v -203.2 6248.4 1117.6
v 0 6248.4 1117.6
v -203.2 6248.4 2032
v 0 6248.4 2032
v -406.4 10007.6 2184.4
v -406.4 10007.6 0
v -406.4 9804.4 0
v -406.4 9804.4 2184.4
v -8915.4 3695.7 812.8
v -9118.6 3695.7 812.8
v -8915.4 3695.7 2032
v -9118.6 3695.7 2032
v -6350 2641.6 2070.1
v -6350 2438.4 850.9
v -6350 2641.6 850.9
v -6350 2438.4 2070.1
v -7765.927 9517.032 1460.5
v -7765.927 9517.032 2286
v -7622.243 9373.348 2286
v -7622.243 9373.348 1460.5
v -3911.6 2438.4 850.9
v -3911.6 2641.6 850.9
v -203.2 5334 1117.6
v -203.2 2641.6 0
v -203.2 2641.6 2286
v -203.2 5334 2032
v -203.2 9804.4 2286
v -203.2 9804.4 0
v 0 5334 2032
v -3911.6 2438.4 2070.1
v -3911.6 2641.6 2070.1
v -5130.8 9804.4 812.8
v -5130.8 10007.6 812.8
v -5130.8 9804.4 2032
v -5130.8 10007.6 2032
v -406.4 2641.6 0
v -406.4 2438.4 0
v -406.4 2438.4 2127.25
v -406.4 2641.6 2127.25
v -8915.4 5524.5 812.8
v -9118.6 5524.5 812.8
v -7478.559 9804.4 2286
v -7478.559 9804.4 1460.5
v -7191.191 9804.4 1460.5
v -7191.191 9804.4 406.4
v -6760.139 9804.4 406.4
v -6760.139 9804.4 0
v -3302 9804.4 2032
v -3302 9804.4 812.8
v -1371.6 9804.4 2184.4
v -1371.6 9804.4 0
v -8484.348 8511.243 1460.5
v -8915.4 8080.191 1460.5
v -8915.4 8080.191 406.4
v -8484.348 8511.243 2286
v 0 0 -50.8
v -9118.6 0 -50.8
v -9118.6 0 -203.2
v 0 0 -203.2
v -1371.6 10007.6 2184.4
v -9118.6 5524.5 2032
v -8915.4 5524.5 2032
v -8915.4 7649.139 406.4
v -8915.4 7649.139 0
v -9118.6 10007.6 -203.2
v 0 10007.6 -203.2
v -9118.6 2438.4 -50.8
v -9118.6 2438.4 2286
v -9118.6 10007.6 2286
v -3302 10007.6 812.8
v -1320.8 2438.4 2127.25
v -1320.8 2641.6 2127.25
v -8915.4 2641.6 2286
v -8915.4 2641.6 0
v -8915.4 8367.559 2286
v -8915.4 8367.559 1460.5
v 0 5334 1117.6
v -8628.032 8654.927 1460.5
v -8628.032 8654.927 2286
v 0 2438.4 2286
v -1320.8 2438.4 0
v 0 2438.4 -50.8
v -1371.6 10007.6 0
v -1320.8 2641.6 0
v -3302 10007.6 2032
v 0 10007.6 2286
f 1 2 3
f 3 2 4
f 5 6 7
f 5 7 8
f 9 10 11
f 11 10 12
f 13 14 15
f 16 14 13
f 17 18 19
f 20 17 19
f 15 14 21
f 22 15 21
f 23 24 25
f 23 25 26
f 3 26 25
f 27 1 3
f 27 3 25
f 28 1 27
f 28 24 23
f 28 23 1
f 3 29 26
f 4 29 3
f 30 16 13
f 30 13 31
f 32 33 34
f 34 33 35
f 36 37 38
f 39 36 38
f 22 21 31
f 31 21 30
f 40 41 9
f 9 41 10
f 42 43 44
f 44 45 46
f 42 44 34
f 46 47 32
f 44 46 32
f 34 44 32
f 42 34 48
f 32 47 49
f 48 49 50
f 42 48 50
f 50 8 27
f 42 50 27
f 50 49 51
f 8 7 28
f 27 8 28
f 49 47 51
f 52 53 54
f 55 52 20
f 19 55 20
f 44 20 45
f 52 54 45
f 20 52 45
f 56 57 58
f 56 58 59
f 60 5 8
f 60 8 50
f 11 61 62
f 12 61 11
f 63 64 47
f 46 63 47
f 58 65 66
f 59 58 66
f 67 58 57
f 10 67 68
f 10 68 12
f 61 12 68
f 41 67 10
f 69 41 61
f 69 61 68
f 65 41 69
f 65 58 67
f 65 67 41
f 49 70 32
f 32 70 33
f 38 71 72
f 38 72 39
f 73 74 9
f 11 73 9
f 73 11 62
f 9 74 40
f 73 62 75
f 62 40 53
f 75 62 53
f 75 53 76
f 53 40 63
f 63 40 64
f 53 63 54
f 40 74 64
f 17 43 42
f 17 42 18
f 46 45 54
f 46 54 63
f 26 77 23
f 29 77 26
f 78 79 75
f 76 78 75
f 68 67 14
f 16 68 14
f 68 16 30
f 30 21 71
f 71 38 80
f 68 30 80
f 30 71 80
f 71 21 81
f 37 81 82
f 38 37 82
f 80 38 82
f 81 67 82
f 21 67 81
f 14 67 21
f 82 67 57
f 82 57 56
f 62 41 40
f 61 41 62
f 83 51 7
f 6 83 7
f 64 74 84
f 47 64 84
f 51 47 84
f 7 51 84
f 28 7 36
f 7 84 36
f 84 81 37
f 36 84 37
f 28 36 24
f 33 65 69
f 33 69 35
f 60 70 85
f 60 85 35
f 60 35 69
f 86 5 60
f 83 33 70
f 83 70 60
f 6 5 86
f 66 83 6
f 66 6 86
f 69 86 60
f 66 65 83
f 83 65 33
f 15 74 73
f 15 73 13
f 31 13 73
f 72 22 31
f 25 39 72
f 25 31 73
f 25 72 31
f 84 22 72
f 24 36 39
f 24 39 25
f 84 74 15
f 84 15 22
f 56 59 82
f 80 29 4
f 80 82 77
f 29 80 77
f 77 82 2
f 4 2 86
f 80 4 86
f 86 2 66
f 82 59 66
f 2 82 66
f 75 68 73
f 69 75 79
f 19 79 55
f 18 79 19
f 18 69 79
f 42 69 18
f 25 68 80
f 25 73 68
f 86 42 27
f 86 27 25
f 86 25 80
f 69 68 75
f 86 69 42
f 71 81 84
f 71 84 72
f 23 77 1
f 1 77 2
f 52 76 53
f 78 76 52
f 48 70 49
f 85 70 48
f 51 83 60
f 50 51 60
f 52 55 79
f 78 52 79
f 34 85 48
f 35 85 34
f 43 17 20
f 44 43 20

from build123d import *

# Parameters (mm, degrees)
F0_W      = 9118.6
F0_H      = 10007.6
F1_DEPTH  = 203.2
F2_W      = 9118.6
F2_H      = 2438.4
F3_DEPTH  = 50.8
F4_W      = 9118.6
F4_H      = 7569.2
F4_W_2    = 8712.2
F4_H_2    = 7162.8
F5_DEPTH  = 2286
F6_W      = 914.4
F6_H      = 2127.25
F6_W_2    = 2438.4
F6_H_2    = 1219.2
F7_DEPTH  = 203.2
F8_W      = 914.4
F8_H      = 914.4
F9_DEPTH  = 203.2
F10_W     = 1828.8
F10_H     = 1219.2
F11_DEPTH = 203.2
F12_W     = 965.2
F12_H     = 2184.4
F13_DEPTH = 25.4
F14_W     = 1828.8
F14_H     = 1219.2
F15_DEPTH = 203.2
F17_DEPTH = 406.4
F19_DEPTH = 1879.6
F21_DEPTH = 825.5
F23_W     = 965.2
F23_H     = 2184.4
F24_DEPTH = 203.2


with BuildPart() as f1:
    # F0 (on Top) → F1 (new body)
    with BuildSketch(Plane.XY):
        with Locations((-4559.3, 5003.8)):
            Rectangle(F0_W, F0_H)
    extrude(amount=-F1_DEPTH)

    # F2 (on face) → F3 (cut)
    with BuildSketch(Plane.XY):
        with Locations((-4559.3, 1219.2)):
            Rectangle(F2_W, F2_H)
    extrude(amount=-F3_DEPTH, mode=Mode.SUBTRACT)

    # F4 (on face) → F5 (join)
    with BuildSketch(Plane.XY):
        with Locations((-4559.3, 6223)):
            Rectangle(F4_W, F4_H)
        with Locations((-4559.3, 6223)):
            Rectangle(F4_W_2, F4_H_2, mode=Mode.SUBTRACT)
    extrude(amount=F5_DEPTH)

    # F6 (on face) → F7 (cut, through all)
    with BuildSketch(Plane.XZ.offset(-2438.4)):
        with Locations((-863.6, 1063.625)):
            Rectangle(F6_W, F6_H)
        with Locations((-5130.8, 1460.5)):
            Rectangle(F6_W_2, F6_H_2)
    extrude(amount=-F7_DEPTH, mode=Mode.SUBTRACT)

    # F8 (on face) → F9 (cut, through all)
    with BuildSketch(Plane.YZ):
        with Locations((5791.2, 1574.8)):
            Rectangle(F8_W, F8_H)
    extrude(amount=-F9_DEPTH, mode=Mode.SUBTRACT)

    # F10 (on face) → F11 (cut, through all)
    with BuildSketch(Plane(origin=(0, 10007.6, 0), x_dir=(-1, 0, 0), z_dir=(0, 1, 0))):
        with Locations((4216.4, 1422.4)):
            Rectangle(F10_W, F10_H)
    extrude(amount=-F11_DEPTH, mode=Mode.SUBTRACT)

    # F12 (on face) → F13 (cut)
    with BuildSketch(Plane(origin=(0, 10007.6, 0), x_dir=(-1, 0, 0), z_dir=(0, 1, 0))):
        with Locations((889, 1092.2)):
            Rectangle(F12_W, F12_H)
    extrude(amount=-F13_DEPTH, mode=Mode.SUBTRACT)

    # F14 (on face) → F15 (cut, through all)
    with BuildSketch(Plane(origin=(-9118.6, 0, 0), x_dir=(0, -1, 0), z_dir=(-1, 0, 0))):
        with Locations((-4610.1, 1422.4)):
            Rectangle(F14_W, F14_H)
    extrude(amount=-F15_DEPTH, mode=Mode.SUBTRACT)

    # F16 (on face) → F17 (join)
    with BuildSketch(Plane.XY):
        Polygon((-6760.138531, 9804.4), (-8915.4, 9804.4), (-8915.4, 7649.138531), align=None)
    extrude(amount=F17_DEPTH)

    # F18 (on face) → F19 (join, through all)
    with BuildSketch(Plane.XY.offset(406.4)):
        Polygon((-8915.4, 9804.4), (-8915.4, 8080.190825), (-7191.190825, 9804.4), align=None)
    extrude(amount=F19_DEPTH)

    # F20 (on face) → F21 (cut)
    with BuildSketch(Plane.XY.offset(2286)):
        Polygon((-8915.4, 8080.190825), (-8484.347706, 8511.243119), (-8628.031804, 8654.927217), (-8915.4, 8367.559021), align=None)
        Polygon((-7765.927217, 9517.031804), (-7622.243119, 9373.347706), (-7191.190825, 9804.4), (-7478.559021, 9804.4), align=None)
    extrude(amount=-F21_DEPTH, mode=Mode.SUBTRACT)

    # F23 (on face) → F24 (cut, through all)
    with BuildSketch(Plane(origin=(0, 10007.6, 0), x_dir=(-1, 0, 0), z_dir=(0, 1, 0))):
        with Locations((889, 1092.2)):
            Rectangle(F23_W, F23_H)
    extrude(amount=-F24_DEPTH, mode=Mode.SUBTRACT)


solid = f1.part
